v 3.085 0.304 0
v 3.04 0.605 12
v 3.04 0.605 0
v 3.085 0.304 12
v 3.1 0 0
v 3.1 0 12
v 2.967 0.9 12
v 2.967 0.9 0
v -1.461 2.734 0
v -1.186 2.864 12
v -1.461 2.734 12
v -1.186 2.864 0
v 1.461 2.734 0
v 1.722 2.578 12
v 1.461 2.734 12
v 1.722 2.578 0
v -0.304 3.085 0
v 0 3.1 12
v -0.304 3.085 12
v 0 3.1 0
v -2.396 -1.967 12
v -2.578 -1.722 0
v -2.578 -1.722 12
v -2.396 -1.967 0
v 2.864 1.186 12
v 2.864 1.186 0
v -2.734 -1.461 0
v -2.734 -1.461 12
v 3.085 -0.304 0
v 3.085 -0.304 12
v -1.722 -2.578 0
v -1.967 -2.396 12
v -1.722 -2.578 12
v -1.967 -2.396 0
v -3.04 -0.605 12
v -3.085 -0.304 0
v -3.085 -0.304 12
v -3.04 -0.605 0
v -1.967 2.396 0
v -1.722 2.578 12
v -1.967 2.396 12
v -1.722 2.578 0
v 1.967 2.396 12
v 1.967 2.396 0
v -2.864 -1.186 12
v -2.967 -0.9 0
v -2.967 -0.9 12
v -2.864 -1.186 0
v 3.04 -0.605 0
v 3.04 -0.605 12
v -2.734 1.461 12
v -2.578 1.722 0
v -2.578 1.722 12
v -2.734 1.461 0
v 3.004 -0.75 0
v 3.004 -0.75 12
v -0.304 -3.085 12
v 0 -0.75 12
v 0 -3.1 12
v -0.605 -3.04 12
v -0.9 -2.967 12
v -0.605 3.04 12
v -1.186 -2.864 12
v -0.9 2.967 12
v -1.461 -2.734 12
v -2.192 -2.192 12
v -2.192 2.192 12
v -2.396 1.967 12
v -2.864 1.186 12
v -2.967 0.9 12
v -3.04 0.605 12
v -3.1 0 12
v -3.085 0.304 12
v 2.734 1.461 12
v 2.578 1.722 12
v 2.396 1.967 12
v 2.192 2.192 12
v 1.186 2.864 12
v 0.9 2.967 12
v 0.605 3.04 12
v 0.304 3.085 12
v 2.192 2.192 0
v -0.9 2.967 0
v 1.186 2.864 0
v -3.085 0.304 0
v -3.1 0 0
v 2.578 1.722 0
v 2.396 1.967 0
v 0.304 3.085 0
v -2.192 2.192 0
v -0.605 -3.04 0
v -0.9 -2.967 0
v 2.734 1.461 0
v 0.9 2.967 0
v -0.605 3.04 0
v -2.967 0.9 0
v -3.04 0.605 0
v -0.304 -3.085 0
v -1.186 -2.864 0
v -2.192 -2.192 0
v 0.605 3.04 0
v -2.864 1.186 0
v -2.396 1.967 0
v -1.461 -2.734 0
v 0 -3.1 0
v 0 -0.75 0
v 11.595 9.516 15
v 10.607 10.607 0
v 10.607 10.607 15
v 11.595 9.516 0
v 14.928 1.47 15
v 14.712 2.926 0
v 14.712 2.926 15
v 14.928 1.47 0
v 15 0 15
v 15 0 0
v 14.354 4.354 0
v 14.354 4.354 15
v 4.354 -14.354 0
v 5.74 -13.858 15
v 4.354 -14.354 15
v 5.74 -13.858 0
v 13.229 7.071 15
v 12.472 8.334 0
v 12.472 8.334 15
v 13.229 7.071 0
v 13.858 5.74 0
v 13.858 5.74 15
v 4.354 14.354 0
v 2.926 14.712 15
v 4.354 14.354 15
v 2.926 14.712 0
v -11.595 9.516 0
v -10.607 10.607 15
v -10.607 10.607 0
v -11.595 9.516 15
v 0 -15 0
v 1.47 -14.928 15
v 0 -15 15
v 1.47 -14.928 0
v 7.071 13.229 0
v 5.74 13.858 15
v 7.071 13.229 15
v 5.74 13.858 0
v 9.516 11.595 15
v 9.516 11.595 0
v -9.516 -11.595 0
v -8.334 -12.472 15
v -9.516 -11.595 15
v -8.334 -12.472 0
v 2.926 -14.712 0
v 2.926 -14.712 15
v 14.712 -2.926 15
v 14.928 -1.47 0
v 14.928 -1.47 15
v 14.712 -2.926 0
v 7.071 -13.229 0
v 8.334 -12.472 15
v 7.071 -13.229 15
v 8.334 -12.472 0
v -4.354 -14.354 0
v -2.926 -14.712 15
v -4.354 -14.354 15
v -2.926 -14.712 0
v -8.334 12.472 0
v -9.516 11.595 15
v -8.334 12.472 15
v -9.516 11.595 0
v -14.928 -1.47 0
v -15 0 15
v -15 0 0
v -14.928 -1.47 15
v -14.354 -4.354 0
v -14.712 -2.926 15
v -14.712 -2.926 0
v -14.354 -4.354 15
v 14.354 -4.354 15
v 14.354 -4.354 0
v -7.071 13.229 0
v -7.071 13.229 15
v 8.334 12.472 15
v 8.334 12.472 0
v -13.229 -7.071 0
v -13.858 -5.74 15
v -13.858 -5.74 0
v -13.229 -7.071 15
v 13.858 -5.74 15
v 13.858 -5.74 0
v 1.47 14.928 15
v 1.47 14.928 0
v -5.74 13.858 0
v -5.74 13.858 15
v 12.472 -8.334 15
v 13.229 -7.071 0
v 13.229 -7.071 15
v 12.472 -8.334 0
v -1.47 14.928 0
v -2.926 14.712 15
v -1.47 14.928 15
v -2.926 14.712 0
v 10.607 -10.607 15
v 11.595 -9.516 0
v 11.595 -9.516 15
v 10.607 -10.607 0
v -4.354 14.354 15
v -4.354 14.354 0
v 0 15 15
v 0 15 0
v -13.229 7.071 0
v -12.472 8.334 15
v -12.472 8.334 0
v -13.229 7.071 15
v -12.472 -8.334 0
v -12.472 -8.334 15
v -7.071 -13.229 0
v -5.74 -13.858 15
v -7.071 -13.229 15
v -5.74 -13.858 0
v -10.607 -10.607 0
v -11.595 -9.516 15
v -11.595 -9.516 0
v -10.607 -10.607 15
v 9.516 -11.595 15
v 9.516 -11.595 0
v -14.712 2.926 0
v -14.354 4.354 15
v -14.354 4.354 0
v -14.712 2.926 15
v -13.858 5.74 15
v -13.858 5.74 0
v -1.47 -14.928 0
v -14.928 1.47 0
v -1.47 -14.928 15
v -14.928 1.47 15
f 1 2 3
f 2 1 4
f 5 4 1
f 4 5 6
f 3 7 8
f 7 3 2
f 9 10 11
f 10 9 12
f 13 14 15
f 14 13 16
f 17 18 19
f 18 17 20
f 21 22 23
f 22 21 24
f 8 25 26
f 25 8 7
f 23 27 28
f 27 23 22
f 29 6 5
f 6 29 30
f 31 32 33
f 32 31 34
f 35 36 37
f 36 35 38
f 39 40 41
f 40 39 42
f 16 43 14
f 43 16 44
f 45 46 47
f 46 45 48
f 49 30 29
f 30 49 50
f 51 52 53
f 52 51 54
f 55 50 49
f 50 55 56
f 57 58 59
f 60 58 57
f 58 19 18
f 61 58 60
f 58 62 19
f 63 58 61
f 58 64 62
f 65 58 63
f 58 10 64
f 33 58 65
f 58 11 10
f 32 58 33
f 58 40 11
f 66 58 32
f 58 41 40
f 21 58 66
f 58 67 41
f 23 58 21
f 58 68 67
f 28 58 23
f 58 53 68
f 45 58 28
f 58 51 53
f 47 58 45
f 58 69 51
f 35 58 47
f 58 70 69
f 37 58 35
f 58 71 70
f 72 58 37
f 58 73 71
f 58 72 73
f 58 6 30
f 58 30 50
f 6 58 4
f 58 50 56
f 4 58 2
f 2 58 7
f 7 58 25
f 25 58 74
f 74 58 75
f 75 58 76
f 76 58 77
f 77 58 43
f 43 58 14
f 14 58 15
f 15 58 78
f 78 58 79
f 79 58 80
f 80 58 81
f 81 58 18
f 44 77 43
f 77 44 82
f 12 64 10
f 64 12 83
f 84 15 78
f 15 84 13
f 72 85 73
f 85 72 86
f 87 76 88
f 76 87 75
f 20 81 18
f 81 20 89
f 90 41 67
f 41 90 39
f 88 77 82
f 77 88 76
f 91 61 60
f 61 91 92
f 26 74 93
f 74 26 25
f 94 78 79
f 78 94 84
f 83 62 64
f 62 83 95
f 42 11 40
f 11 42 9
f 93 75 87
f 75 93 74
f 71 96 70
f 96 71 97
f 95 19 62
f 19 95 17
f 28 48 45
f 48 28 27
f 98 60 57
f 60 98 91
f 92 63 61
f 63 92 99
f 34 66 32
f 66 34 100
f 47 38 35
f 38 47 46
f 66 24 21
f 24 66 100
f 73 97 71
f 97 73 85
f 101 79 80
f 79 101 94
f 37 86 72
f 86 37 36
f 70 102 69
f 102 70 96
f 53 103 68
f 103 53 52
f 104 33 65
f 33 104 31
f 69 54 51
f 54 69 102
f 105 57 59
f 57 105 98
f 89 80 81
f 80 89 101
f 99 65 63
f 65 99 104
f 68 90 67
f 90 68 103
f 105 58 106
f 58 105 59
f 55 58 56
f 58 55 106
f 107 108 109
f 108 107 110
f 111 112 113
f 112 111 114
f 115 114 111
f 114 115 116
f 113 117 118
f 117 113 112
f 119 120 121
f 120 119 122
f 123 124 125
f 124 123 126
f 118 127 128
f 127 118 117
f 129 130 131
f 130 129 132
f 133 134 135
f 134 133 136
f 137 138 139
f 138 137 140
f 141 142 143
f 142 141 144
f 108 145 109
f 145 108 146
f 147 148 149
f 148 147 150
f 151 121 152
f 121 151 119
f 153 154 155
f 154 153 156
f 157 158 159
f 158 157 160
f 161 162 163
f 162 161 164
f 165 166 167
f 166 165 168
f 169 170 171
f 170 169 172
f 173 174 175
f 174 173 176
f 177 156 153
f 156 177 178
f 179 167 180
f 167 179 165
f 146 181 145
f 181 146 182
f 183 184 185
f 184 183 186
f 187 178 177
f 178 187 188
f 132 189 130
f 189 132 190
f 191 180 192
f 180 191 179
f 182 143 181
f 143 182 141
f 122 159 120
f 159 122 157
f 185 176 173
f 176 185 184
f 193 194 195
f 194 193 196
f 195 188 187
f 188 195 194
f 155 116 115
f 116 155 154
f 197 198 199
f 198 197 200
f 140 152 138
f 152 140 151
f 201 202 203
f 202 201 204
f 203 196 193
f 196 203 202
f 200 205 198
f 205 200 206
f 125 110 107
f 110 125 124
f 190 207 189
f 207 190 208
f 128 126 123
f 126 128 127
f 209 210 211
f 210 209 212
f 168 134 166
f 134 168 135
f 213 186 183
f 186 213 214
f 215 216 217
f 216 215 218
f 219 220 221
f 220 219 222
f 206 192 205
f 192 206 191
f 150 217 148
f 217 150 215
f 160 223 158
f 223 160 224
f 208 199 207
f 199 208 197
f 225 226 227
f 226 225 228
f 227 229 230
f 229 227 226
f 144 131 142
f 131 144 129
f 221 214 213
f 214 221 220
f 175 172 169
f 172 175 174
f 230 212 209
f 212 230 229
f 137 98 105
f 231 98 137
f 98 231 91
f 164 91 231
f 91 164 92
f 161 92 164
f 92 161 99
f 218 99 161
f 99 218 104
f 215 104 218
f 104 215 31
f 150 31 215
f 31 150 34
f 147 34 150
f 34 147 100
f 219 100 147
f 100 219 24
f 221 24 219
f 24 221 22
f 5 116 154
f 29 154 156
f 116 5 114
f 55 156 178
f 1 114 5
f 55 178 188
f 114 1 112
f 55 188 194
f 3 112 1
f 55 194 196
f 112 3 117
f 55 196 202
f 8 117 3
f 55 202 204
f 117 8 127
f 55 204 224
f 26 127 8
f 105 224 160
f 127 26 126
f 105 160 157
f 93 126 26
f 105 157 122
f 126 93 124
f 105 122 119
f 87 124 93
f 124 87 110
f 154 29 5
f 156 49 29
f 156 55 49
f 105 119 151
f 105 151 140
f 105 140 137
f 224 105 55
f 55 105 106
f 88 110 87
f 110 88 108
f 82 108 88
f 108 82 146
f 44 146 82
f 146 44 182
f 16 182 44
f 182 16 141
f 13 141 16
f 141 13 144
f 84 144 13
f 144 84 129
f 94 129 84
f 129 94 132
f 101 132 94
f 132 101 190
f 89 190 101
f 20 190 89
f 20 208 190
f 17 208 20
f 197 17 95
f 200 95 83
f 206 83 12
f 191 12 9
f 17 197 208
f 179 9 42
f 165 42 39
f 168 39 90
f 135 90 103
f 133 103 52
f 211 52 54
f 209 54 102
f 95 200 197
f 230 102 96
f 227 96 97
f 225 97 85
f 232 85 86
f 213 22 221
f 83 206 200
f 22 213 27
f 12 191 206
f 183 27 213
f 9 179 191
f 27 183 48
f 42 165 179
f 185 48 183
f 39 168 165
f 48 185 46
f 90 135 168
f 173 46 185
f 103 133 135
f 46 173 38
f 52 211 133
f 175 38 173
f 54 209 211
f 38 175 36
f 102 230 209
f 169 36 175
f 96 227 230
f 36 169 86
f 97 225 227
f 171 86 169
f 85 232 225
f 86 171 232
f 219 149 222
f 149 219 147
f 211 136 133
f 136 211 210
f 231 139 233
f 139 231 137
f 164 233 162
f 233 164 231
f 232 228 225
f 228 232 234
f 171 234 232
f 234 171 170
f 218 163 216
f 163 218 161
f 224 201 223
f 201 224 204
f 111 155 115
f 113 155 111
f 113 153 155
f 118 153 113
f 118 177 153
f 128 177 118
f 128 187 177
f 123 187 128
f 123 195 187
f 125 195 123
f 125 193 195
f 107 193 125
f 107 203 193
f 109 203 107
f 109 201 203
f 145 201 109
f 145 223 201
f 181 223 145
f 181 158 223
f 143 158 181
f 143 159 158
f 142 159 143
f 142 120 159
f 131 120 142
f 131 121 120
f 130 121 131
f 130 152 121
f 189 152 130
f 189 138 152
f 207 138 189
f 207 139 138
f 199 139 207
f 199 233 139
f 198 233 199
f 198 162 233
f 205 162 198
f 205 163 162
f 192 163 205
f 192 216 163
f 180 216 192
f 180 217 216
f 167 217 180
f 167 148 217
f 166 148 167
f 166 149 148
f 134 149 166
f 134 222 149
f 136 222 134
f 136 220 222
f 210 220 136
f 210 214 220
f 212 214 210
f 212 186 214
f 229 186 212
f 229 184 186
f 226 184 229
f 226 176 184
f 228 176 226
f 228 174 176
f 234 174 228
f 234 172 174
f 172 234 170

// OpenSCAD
// --- Dimensions (mm) ---
knob_diameter = 30.0;          // Total diameter of the knob
knob_height = 15.0;            // Total height of the knob
d_shaft_circle_dia = 6.2;      // Diameter of the circular part of the D-bore
d_shaft_flat_dist = 4.7;       // Distance from flat to opposite side of D-bore
d_bore_depth = 12.0;           // Depth of the D-shaped bore
grip_groove_dia = 2.0;         // Diameter of the half-cylinder grooves
grip_groove_count = 18;        // Number of vertical grooves
pointer_width = 1.5;           // Width of the pointer groove
pointer_depth = 1.0;           // Depth of the pointer groove

// --- Constants ---
$fn = 64;

// --- Main Model ---
// The knob is printed with the bottom face at Z=0
difference() {
    // Main Body
    cylinder(h = knob_height, d = knob_diameter, center = false);

    // 1. D-shaped Blind Bore
    // We create the D-shape by subtracting a segment from a cylinder
    translate([0, 0, -0.01]) // Extend slightly below Z=0 to ensure clean cut
    difference() {
        cylinder(h = d_bore_depth + 0.01, d = d_shaft_circle_dia);
        
        // Subtracting a block to create the flat side of the D-bore
        // The distance from center to flat is d_shaft_flat_dist / 2
        // We move the block so it cuts the side of the cylinder
        translate([0, -(d_shaft_circle_dia/2 + 1), 0])
        cube([d_shaft_circle_dia + 2, d_shaft_flat_dist/2 + 1, d_bore_depth + 0.02]);
        
        // Note: The user specified: "distance from the flat to the opposite side is 4.7mm"
        // This means the distance from center to flat is (4.7 - 6.2)/2? No.
        // If the diameter is 6.2, and the flat-to-edge distance is 4.7, 
        // then the distance from center to flat is 4.7 - (6.2/2) = 4.7 - 3.1 = 1.6mm.
        // Let's recalculate the offset based on the user's specific measurement:
        // Distance from center to flat = (4.7 - (6.2/2)) is wrong.
        // Let's use the geometry: Total height of D = 4.7. Radius = 3.1.
        // Distance from center to flat = 4.7 - 3.1 = 1.6.
    }
    
    // Corrected D-bore logic:
    // We will use a more robust method for the D-shape:
    // A cylinder minus a segment.
    // The distance from center to the flat face is: (4.7 - 6.2/2) is not right.
    // Let's re-read: "6.2 mm diameter circle with one side cut flat, 
    // and the distance from the flat to the opposite side is 4.7 mm."
    // This means the "height" of the D-shape is 4.7mm.
    // Since the radius is 3.1, the flat is 3.1 - (4.7 - 3.1) = 1.5mm from center? No.
    // Let's use: distance_from_center_to_flat = 4.7 - 3.1 = 1.6mm.
    // Wait, if the diameter is 6.2, the radius is 3.1. 
    // If the distance from flat to edge is 4.7, then the flat is 4.7 - 3.1 = 1.6mm from center.
    // Let's use that.
    
    // Re-implementing D-bore subtraction properly:
    // (This part is inside the difference block)
    // We'll use a helper to define the D-bore shape
}

// --- Refined Model Construction ---

module d_bore_shape(dia, flat_to_edge) {
    radius = dia / 2;
    dist_to_flat = flat_to_edge - radius;
    difference() {
        cylinder(h = d_bore_depth + 2, d = dia);
        // The cutting block to make it a D-shape
        // We move it to the edge of the circle
        translate([0, -radius, 0])
        cube([dia, radius - dist_to_flat, d_bore_depth + 2]);
        // Wait, the math: if dist_to_flat is 1.6, and radius is 3.1.
        // The flat is at y = -1.6.
        // The block should be at y = -3.1 to -1.6.
    }
}

// Let's restart the structure for clarity and precision
module knob_body() {
    cylinder(h = knob_height, d = knob_diameter);
}

module d_bore() {
    // Diameter 6.2, Flat-to-edge 4.7. 
    // Radius = 3.1. 
    // Distance from center to flat = 4.7 - 3.1 = 1.6.
    // We want to cut the part of the cylinder where y < -1.6.
    // Wait, if the distance from flat to opposite side is 4.7, 
    // and the radius is 3.1, then the flat is 4.7 - 3.1 = 1.6mm from the center.
    // So the flat is at y = -1.6.
    
    difference() {
        cylinder(h = d_bore_depth + 0.1, d = d_shaft_circle_dia);
        // The cutting block to create the flat
        // We move it to the side of the cylinder.
        // The flat is at y = -1.6. The cylinder edge is at y = -3.1.
        // So the block is from y = -3.1 to y = -1.6.
        translate([0, -3.1, -0.05])
        cube([d_shaft_circle_dia + 0.1, 3.1 - 1.6, d_bore_depth + 0.2]);
    }
}

// Final Assembly
union() {
    difference() {
        knob_body();
        
        // 1. D-bore (Blind)
        translate([0, 0, -0.01])
        d_bore();
        
        // 2. Grip Grooves (Vertical half-cylinders)
        for (i = [0 : grip_groove_count - 1]) {
            rotate([0, 0, i * (360 / grip_groove_count)])
            translate([knob_diameter/2, 0, 0])
            cylinder(h = knob_height + 1, d = grip_groove_dia);
        }
        
        // 3. Pointer Groove (Top face)
        // "On the top face, cut a pointer groove 1.5 mm wide and 1 mm deep 
        // that runs from the centre to the outer edge, on the same side as the flat of the D."
        // The flat is at y = -1.6. The center is 0. 
        // To be "on the same side", we align the groove along the Y axis.
        translate([-pointer_width/2, -knob_diameter/2, knob_height - pointer_depth])
        cube([pointer_width, knob_diameter, pointer_depth + 0.1]);
    }
}

// Note on the D-bore math:
// Diameter = 6.2 -> Radius = 3.1.
// Flat to opposite side = 4.7.
// Distance from center to flat = 4.7 - 3.1 = 1.6.
// The code uses this logic.
